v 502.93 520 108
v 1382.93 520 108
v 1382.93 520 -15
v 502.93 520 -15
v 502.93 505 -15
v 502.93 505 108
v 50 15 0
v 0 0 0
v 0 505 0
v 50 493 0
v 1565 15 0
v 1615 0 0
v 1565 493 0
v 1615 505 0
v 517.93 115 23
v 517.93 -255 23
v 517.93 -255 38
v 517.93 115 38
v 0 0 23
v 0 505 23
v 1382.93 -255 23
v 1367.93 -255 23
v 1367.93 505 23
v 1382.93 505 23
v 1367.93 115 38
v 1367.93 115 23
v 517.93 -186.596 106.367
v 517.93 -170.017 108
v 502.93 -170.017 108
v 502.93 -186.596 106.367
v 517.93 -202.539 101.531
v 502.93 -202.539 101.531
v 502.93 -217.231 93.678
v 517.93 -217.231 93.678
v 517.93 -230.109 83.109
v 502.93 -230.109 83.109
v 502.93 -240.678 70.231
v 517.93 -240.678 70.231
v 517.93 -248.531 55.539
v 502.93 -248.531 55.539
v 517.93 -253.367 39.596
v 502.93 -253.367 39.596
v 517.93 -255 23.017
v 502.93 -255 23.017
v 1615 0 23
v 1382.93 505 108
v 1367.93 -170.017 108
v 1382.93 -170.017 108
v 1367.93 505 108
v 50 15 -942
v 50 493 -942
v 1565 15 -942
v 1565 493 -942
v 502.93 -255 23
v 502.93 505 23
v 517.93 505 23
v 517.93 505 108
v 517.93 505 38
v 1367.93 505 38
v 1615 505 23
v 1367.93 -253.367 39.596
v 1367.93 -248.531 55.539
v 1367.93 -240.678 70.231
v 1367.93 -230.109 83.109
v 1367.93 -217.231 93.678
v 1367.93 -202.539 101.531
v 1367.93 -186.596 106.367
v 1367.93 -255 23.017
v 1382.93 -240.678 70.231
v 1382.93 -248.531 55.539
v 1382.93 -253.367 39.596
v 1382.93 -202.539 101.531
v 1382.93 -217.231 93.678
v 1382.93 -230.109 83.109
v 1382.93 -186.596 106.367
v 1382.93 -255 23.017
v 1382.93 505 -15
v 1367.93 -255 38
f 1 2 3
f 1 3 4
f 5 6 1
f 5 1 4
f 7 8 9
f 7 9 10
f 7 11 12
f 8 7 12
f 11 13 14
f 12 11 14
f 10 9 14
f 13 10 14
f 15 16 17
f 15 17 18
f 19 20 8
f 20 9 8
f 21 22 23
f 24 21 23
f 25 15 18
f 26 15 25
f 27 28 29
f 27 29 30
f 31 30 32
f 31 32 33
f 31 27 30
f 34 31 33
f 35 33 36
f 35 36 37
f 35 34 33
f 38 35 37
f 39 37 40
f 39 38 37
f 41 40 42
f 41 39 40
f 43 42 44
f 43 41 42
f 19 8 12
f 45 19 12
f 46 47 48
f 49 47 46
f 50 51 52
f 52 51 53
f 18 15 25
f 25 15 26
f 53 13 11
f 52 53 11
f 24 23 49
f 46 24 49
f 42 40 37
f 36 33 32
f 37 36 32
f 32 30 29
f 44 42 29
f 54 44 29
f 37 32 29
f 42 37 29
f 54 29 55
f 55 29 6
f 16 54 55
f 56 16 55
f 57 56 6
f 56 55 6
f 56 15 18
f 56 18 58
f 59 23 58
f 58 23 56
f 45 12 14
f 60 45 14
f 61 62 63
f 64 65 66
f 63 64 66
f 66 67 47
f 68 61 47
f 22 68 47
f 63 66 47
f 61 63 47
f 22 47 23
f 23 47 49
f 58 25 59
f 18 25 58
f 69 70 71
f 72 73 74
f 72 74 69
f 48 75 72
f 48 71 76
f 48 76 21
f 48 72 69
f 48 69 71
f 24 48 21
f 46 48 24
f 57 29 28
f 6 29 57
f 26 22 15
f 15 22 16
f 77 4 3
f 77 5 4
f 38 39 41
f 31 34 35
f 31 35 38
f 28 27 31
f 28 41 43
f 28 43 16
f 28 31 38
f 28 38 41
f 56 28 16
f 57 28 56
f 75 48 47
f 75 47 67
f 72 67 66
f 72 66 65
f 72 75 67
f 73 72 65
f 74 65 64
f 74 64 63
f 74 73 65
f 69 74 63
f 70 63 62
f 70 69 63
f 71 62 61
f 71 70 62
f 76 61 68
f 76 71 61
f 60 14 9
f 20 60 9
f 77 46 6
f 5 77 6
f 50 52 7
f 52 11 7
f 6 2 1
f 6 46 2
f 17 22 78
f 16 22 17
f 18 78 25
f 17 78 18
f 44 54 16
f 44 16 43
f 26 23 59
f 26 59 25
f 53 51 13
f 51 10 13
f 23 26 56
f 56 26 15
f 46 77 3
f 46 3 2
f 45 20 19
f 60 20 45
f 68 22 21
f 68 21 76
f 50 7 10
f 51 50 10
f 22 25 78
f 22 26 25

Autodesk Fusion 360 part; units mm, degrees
sketch "Sketch1" plane through (0, 0, 0) normal (0, 0, 1) x (1, 0, 0)
  line L0 (0, 0) -> (1615, 0)
  line L1 (1615, 0) -> (1615, 505)
  line L2 (1615, 505) -> (0, 505)
  line L3 (0, 505) -> (0, 0)
  line L4 (50, 493) -> (1565, 493)
  line L5 (1565, 493) -> (1565, 15)
  line L6 (1565, 15) -> (50, 15)
  line L7 (50, 15) -> (50, 493)
  dimension "d1" = 505
  dimension "d2" = 1615
  dimension "d3" = 12
  dimension "d4" = 50
  dimension "d5" = 50
  dimension "d6" = 15
extrude "Extrude1" add sketch "Sketch1" along normal blind 23 contours L0 L1 L2 L3 | L4 L5 L6 L7 makes body 1
extrude "Extrude2" add sketch "Sketch1" against normal blind 942 contours L4 L5 L6 L7 bodies 1
sketch "Sketch2" plane through (0, 0, 23) normal (0, 0, 1) x (-1, 0, 0)
  line L0 (0, -505) -> (0, 0)
  line L1 (0, 0) -> (-1615, 0)
  line L2 (-1615, 0) -> (-1615, -505)
  line L3 (-1615, -505) -> (0, -505)
  line L4 (-517.9302, -505) -> (-1367.9302, -505)
  line L5 (-1367.9302, -505) -> (-1367.9302, 255)
  line L6 (-1367.9302, 255) -> (-517.9302, 255)
  line L7 (-517.9302, 255) -> (-517.9302, -505)
  line L8 (-1615, -505) -> (0, -505)
  line L9 (-517.9302, -115) -> (-1367.9302, -115)
  dimension "d11" = 850
  dimension "d12" = 760
  dimension "d15" = 390
extrude "Extrude3" add sketch "Sketch2" along normal blind 15 separate body contours L3 L4 L5 L7 L8 L9 makes body 2
extrude "Extrude4" add sketch "Sketch2" along normal blind 15 separate body contours L1 L5 L7 L9 | L1 L5 L6 L7 makes body 3
sketch "Sketch3" plane through (1367.9302, 0, 0) normal (1, 0, 0) x (0, 1, 0)
  line L0 (115, 23) -> (505, 23)
  line L1 (505, 23) -> (505, 38)
  line L2 (505, 38) -> (115, 38)
  line L3 (115, 38) -> (115, 23)
  line L4 (505, 23) -> (-255, 23)
  line L5 (-255, 23) -> (-255, 108)
  line L6 (-255, 108) -> (505, 108)
  line L7 (505, 108) -> (505, 23)
  dimension "d21" = 760
  dimension "d22" = 85
extrude "Extrude5" add sketch "Sketch3" along normal blind 15 separate body makes body 4
extrude "Extrude6" add sketch "Sketch3" along normal blind 15 from surface at -865 separate body makes body 5
sketch "Sketch6" plane through (0, 505, 0) normal (0, 1, 0) x (-1, 0, 0)
  line L0 (-1615, 0) -> (0, 0)
  line L1 (0, 0) -> (0, 23)
  line L2 (0, 23) -> (-1615, 23)
  line L3 (-1615, 23) -> (-1615, 0)
  line L4 (-1382.9302, 108) -> (-502.9302, 108)
  line L5 (-502.9302, 108) -> (-502.9302, -15)
  line L6 (-502.9302, -15) -> (-1382.9302, -15)
  line L7 (-1382.9302, -15) -> (-1382.9302, 108)
  point P0 (-1382.9302, 108)
  point P1 (-502.9302, 108)
  dimension "d29" = 15
extrude "Extrude7" add sketch "Sketch6" along normal blind 15 separate body contours L0 L2 L5 L7 | L0 L5 L6 L7 | L2 L4 L5 L7 makes body 6
fillet "Fillet1" radius 85 2 edges at (1375.4302, -255, 108) (510.4302, -255, 108) on bodies 4 5
copy_body "Body->Comp1" bodies 2 removing the originals makes body 7 in component "base back"
copy_body "Body->Comp2" bodies 3 removing the originals makes body 8 in component "base front"
component "base back" placed x (1, 0, 0) y (0, 1, 0) z (0, 0, 1) at (0, 0, 0)
component "base front" placed x (1, 0, 0) y (0, 1, 0) z (0, 0, 1) at (0, 0, 0)
equation "d11 = base_width"
equation "d12 = base_height"
equation "base_width = 850 mm"
equation "base_height = 760 mm"
equation "d15 = base_height / 2 + 10 mm"
equation "material_thickness = 15 mm"
equation "d17 = material_thickness"
equation "d19 = material_thickness"
equation "d21 = base_height"
equation "d22 = base_sidewalls - material_thickness"
equation "base_sidewalls = 100 mm"
equation "d24 = material_thickness"
equation "d26 = -( base_width + material_thickness )"
equation "d27 = material_thickness"
equation "d29 = material_thickness"
equation "d30 = material_thickness"
equation "d33 = base_sidewalls - material_thickness"
